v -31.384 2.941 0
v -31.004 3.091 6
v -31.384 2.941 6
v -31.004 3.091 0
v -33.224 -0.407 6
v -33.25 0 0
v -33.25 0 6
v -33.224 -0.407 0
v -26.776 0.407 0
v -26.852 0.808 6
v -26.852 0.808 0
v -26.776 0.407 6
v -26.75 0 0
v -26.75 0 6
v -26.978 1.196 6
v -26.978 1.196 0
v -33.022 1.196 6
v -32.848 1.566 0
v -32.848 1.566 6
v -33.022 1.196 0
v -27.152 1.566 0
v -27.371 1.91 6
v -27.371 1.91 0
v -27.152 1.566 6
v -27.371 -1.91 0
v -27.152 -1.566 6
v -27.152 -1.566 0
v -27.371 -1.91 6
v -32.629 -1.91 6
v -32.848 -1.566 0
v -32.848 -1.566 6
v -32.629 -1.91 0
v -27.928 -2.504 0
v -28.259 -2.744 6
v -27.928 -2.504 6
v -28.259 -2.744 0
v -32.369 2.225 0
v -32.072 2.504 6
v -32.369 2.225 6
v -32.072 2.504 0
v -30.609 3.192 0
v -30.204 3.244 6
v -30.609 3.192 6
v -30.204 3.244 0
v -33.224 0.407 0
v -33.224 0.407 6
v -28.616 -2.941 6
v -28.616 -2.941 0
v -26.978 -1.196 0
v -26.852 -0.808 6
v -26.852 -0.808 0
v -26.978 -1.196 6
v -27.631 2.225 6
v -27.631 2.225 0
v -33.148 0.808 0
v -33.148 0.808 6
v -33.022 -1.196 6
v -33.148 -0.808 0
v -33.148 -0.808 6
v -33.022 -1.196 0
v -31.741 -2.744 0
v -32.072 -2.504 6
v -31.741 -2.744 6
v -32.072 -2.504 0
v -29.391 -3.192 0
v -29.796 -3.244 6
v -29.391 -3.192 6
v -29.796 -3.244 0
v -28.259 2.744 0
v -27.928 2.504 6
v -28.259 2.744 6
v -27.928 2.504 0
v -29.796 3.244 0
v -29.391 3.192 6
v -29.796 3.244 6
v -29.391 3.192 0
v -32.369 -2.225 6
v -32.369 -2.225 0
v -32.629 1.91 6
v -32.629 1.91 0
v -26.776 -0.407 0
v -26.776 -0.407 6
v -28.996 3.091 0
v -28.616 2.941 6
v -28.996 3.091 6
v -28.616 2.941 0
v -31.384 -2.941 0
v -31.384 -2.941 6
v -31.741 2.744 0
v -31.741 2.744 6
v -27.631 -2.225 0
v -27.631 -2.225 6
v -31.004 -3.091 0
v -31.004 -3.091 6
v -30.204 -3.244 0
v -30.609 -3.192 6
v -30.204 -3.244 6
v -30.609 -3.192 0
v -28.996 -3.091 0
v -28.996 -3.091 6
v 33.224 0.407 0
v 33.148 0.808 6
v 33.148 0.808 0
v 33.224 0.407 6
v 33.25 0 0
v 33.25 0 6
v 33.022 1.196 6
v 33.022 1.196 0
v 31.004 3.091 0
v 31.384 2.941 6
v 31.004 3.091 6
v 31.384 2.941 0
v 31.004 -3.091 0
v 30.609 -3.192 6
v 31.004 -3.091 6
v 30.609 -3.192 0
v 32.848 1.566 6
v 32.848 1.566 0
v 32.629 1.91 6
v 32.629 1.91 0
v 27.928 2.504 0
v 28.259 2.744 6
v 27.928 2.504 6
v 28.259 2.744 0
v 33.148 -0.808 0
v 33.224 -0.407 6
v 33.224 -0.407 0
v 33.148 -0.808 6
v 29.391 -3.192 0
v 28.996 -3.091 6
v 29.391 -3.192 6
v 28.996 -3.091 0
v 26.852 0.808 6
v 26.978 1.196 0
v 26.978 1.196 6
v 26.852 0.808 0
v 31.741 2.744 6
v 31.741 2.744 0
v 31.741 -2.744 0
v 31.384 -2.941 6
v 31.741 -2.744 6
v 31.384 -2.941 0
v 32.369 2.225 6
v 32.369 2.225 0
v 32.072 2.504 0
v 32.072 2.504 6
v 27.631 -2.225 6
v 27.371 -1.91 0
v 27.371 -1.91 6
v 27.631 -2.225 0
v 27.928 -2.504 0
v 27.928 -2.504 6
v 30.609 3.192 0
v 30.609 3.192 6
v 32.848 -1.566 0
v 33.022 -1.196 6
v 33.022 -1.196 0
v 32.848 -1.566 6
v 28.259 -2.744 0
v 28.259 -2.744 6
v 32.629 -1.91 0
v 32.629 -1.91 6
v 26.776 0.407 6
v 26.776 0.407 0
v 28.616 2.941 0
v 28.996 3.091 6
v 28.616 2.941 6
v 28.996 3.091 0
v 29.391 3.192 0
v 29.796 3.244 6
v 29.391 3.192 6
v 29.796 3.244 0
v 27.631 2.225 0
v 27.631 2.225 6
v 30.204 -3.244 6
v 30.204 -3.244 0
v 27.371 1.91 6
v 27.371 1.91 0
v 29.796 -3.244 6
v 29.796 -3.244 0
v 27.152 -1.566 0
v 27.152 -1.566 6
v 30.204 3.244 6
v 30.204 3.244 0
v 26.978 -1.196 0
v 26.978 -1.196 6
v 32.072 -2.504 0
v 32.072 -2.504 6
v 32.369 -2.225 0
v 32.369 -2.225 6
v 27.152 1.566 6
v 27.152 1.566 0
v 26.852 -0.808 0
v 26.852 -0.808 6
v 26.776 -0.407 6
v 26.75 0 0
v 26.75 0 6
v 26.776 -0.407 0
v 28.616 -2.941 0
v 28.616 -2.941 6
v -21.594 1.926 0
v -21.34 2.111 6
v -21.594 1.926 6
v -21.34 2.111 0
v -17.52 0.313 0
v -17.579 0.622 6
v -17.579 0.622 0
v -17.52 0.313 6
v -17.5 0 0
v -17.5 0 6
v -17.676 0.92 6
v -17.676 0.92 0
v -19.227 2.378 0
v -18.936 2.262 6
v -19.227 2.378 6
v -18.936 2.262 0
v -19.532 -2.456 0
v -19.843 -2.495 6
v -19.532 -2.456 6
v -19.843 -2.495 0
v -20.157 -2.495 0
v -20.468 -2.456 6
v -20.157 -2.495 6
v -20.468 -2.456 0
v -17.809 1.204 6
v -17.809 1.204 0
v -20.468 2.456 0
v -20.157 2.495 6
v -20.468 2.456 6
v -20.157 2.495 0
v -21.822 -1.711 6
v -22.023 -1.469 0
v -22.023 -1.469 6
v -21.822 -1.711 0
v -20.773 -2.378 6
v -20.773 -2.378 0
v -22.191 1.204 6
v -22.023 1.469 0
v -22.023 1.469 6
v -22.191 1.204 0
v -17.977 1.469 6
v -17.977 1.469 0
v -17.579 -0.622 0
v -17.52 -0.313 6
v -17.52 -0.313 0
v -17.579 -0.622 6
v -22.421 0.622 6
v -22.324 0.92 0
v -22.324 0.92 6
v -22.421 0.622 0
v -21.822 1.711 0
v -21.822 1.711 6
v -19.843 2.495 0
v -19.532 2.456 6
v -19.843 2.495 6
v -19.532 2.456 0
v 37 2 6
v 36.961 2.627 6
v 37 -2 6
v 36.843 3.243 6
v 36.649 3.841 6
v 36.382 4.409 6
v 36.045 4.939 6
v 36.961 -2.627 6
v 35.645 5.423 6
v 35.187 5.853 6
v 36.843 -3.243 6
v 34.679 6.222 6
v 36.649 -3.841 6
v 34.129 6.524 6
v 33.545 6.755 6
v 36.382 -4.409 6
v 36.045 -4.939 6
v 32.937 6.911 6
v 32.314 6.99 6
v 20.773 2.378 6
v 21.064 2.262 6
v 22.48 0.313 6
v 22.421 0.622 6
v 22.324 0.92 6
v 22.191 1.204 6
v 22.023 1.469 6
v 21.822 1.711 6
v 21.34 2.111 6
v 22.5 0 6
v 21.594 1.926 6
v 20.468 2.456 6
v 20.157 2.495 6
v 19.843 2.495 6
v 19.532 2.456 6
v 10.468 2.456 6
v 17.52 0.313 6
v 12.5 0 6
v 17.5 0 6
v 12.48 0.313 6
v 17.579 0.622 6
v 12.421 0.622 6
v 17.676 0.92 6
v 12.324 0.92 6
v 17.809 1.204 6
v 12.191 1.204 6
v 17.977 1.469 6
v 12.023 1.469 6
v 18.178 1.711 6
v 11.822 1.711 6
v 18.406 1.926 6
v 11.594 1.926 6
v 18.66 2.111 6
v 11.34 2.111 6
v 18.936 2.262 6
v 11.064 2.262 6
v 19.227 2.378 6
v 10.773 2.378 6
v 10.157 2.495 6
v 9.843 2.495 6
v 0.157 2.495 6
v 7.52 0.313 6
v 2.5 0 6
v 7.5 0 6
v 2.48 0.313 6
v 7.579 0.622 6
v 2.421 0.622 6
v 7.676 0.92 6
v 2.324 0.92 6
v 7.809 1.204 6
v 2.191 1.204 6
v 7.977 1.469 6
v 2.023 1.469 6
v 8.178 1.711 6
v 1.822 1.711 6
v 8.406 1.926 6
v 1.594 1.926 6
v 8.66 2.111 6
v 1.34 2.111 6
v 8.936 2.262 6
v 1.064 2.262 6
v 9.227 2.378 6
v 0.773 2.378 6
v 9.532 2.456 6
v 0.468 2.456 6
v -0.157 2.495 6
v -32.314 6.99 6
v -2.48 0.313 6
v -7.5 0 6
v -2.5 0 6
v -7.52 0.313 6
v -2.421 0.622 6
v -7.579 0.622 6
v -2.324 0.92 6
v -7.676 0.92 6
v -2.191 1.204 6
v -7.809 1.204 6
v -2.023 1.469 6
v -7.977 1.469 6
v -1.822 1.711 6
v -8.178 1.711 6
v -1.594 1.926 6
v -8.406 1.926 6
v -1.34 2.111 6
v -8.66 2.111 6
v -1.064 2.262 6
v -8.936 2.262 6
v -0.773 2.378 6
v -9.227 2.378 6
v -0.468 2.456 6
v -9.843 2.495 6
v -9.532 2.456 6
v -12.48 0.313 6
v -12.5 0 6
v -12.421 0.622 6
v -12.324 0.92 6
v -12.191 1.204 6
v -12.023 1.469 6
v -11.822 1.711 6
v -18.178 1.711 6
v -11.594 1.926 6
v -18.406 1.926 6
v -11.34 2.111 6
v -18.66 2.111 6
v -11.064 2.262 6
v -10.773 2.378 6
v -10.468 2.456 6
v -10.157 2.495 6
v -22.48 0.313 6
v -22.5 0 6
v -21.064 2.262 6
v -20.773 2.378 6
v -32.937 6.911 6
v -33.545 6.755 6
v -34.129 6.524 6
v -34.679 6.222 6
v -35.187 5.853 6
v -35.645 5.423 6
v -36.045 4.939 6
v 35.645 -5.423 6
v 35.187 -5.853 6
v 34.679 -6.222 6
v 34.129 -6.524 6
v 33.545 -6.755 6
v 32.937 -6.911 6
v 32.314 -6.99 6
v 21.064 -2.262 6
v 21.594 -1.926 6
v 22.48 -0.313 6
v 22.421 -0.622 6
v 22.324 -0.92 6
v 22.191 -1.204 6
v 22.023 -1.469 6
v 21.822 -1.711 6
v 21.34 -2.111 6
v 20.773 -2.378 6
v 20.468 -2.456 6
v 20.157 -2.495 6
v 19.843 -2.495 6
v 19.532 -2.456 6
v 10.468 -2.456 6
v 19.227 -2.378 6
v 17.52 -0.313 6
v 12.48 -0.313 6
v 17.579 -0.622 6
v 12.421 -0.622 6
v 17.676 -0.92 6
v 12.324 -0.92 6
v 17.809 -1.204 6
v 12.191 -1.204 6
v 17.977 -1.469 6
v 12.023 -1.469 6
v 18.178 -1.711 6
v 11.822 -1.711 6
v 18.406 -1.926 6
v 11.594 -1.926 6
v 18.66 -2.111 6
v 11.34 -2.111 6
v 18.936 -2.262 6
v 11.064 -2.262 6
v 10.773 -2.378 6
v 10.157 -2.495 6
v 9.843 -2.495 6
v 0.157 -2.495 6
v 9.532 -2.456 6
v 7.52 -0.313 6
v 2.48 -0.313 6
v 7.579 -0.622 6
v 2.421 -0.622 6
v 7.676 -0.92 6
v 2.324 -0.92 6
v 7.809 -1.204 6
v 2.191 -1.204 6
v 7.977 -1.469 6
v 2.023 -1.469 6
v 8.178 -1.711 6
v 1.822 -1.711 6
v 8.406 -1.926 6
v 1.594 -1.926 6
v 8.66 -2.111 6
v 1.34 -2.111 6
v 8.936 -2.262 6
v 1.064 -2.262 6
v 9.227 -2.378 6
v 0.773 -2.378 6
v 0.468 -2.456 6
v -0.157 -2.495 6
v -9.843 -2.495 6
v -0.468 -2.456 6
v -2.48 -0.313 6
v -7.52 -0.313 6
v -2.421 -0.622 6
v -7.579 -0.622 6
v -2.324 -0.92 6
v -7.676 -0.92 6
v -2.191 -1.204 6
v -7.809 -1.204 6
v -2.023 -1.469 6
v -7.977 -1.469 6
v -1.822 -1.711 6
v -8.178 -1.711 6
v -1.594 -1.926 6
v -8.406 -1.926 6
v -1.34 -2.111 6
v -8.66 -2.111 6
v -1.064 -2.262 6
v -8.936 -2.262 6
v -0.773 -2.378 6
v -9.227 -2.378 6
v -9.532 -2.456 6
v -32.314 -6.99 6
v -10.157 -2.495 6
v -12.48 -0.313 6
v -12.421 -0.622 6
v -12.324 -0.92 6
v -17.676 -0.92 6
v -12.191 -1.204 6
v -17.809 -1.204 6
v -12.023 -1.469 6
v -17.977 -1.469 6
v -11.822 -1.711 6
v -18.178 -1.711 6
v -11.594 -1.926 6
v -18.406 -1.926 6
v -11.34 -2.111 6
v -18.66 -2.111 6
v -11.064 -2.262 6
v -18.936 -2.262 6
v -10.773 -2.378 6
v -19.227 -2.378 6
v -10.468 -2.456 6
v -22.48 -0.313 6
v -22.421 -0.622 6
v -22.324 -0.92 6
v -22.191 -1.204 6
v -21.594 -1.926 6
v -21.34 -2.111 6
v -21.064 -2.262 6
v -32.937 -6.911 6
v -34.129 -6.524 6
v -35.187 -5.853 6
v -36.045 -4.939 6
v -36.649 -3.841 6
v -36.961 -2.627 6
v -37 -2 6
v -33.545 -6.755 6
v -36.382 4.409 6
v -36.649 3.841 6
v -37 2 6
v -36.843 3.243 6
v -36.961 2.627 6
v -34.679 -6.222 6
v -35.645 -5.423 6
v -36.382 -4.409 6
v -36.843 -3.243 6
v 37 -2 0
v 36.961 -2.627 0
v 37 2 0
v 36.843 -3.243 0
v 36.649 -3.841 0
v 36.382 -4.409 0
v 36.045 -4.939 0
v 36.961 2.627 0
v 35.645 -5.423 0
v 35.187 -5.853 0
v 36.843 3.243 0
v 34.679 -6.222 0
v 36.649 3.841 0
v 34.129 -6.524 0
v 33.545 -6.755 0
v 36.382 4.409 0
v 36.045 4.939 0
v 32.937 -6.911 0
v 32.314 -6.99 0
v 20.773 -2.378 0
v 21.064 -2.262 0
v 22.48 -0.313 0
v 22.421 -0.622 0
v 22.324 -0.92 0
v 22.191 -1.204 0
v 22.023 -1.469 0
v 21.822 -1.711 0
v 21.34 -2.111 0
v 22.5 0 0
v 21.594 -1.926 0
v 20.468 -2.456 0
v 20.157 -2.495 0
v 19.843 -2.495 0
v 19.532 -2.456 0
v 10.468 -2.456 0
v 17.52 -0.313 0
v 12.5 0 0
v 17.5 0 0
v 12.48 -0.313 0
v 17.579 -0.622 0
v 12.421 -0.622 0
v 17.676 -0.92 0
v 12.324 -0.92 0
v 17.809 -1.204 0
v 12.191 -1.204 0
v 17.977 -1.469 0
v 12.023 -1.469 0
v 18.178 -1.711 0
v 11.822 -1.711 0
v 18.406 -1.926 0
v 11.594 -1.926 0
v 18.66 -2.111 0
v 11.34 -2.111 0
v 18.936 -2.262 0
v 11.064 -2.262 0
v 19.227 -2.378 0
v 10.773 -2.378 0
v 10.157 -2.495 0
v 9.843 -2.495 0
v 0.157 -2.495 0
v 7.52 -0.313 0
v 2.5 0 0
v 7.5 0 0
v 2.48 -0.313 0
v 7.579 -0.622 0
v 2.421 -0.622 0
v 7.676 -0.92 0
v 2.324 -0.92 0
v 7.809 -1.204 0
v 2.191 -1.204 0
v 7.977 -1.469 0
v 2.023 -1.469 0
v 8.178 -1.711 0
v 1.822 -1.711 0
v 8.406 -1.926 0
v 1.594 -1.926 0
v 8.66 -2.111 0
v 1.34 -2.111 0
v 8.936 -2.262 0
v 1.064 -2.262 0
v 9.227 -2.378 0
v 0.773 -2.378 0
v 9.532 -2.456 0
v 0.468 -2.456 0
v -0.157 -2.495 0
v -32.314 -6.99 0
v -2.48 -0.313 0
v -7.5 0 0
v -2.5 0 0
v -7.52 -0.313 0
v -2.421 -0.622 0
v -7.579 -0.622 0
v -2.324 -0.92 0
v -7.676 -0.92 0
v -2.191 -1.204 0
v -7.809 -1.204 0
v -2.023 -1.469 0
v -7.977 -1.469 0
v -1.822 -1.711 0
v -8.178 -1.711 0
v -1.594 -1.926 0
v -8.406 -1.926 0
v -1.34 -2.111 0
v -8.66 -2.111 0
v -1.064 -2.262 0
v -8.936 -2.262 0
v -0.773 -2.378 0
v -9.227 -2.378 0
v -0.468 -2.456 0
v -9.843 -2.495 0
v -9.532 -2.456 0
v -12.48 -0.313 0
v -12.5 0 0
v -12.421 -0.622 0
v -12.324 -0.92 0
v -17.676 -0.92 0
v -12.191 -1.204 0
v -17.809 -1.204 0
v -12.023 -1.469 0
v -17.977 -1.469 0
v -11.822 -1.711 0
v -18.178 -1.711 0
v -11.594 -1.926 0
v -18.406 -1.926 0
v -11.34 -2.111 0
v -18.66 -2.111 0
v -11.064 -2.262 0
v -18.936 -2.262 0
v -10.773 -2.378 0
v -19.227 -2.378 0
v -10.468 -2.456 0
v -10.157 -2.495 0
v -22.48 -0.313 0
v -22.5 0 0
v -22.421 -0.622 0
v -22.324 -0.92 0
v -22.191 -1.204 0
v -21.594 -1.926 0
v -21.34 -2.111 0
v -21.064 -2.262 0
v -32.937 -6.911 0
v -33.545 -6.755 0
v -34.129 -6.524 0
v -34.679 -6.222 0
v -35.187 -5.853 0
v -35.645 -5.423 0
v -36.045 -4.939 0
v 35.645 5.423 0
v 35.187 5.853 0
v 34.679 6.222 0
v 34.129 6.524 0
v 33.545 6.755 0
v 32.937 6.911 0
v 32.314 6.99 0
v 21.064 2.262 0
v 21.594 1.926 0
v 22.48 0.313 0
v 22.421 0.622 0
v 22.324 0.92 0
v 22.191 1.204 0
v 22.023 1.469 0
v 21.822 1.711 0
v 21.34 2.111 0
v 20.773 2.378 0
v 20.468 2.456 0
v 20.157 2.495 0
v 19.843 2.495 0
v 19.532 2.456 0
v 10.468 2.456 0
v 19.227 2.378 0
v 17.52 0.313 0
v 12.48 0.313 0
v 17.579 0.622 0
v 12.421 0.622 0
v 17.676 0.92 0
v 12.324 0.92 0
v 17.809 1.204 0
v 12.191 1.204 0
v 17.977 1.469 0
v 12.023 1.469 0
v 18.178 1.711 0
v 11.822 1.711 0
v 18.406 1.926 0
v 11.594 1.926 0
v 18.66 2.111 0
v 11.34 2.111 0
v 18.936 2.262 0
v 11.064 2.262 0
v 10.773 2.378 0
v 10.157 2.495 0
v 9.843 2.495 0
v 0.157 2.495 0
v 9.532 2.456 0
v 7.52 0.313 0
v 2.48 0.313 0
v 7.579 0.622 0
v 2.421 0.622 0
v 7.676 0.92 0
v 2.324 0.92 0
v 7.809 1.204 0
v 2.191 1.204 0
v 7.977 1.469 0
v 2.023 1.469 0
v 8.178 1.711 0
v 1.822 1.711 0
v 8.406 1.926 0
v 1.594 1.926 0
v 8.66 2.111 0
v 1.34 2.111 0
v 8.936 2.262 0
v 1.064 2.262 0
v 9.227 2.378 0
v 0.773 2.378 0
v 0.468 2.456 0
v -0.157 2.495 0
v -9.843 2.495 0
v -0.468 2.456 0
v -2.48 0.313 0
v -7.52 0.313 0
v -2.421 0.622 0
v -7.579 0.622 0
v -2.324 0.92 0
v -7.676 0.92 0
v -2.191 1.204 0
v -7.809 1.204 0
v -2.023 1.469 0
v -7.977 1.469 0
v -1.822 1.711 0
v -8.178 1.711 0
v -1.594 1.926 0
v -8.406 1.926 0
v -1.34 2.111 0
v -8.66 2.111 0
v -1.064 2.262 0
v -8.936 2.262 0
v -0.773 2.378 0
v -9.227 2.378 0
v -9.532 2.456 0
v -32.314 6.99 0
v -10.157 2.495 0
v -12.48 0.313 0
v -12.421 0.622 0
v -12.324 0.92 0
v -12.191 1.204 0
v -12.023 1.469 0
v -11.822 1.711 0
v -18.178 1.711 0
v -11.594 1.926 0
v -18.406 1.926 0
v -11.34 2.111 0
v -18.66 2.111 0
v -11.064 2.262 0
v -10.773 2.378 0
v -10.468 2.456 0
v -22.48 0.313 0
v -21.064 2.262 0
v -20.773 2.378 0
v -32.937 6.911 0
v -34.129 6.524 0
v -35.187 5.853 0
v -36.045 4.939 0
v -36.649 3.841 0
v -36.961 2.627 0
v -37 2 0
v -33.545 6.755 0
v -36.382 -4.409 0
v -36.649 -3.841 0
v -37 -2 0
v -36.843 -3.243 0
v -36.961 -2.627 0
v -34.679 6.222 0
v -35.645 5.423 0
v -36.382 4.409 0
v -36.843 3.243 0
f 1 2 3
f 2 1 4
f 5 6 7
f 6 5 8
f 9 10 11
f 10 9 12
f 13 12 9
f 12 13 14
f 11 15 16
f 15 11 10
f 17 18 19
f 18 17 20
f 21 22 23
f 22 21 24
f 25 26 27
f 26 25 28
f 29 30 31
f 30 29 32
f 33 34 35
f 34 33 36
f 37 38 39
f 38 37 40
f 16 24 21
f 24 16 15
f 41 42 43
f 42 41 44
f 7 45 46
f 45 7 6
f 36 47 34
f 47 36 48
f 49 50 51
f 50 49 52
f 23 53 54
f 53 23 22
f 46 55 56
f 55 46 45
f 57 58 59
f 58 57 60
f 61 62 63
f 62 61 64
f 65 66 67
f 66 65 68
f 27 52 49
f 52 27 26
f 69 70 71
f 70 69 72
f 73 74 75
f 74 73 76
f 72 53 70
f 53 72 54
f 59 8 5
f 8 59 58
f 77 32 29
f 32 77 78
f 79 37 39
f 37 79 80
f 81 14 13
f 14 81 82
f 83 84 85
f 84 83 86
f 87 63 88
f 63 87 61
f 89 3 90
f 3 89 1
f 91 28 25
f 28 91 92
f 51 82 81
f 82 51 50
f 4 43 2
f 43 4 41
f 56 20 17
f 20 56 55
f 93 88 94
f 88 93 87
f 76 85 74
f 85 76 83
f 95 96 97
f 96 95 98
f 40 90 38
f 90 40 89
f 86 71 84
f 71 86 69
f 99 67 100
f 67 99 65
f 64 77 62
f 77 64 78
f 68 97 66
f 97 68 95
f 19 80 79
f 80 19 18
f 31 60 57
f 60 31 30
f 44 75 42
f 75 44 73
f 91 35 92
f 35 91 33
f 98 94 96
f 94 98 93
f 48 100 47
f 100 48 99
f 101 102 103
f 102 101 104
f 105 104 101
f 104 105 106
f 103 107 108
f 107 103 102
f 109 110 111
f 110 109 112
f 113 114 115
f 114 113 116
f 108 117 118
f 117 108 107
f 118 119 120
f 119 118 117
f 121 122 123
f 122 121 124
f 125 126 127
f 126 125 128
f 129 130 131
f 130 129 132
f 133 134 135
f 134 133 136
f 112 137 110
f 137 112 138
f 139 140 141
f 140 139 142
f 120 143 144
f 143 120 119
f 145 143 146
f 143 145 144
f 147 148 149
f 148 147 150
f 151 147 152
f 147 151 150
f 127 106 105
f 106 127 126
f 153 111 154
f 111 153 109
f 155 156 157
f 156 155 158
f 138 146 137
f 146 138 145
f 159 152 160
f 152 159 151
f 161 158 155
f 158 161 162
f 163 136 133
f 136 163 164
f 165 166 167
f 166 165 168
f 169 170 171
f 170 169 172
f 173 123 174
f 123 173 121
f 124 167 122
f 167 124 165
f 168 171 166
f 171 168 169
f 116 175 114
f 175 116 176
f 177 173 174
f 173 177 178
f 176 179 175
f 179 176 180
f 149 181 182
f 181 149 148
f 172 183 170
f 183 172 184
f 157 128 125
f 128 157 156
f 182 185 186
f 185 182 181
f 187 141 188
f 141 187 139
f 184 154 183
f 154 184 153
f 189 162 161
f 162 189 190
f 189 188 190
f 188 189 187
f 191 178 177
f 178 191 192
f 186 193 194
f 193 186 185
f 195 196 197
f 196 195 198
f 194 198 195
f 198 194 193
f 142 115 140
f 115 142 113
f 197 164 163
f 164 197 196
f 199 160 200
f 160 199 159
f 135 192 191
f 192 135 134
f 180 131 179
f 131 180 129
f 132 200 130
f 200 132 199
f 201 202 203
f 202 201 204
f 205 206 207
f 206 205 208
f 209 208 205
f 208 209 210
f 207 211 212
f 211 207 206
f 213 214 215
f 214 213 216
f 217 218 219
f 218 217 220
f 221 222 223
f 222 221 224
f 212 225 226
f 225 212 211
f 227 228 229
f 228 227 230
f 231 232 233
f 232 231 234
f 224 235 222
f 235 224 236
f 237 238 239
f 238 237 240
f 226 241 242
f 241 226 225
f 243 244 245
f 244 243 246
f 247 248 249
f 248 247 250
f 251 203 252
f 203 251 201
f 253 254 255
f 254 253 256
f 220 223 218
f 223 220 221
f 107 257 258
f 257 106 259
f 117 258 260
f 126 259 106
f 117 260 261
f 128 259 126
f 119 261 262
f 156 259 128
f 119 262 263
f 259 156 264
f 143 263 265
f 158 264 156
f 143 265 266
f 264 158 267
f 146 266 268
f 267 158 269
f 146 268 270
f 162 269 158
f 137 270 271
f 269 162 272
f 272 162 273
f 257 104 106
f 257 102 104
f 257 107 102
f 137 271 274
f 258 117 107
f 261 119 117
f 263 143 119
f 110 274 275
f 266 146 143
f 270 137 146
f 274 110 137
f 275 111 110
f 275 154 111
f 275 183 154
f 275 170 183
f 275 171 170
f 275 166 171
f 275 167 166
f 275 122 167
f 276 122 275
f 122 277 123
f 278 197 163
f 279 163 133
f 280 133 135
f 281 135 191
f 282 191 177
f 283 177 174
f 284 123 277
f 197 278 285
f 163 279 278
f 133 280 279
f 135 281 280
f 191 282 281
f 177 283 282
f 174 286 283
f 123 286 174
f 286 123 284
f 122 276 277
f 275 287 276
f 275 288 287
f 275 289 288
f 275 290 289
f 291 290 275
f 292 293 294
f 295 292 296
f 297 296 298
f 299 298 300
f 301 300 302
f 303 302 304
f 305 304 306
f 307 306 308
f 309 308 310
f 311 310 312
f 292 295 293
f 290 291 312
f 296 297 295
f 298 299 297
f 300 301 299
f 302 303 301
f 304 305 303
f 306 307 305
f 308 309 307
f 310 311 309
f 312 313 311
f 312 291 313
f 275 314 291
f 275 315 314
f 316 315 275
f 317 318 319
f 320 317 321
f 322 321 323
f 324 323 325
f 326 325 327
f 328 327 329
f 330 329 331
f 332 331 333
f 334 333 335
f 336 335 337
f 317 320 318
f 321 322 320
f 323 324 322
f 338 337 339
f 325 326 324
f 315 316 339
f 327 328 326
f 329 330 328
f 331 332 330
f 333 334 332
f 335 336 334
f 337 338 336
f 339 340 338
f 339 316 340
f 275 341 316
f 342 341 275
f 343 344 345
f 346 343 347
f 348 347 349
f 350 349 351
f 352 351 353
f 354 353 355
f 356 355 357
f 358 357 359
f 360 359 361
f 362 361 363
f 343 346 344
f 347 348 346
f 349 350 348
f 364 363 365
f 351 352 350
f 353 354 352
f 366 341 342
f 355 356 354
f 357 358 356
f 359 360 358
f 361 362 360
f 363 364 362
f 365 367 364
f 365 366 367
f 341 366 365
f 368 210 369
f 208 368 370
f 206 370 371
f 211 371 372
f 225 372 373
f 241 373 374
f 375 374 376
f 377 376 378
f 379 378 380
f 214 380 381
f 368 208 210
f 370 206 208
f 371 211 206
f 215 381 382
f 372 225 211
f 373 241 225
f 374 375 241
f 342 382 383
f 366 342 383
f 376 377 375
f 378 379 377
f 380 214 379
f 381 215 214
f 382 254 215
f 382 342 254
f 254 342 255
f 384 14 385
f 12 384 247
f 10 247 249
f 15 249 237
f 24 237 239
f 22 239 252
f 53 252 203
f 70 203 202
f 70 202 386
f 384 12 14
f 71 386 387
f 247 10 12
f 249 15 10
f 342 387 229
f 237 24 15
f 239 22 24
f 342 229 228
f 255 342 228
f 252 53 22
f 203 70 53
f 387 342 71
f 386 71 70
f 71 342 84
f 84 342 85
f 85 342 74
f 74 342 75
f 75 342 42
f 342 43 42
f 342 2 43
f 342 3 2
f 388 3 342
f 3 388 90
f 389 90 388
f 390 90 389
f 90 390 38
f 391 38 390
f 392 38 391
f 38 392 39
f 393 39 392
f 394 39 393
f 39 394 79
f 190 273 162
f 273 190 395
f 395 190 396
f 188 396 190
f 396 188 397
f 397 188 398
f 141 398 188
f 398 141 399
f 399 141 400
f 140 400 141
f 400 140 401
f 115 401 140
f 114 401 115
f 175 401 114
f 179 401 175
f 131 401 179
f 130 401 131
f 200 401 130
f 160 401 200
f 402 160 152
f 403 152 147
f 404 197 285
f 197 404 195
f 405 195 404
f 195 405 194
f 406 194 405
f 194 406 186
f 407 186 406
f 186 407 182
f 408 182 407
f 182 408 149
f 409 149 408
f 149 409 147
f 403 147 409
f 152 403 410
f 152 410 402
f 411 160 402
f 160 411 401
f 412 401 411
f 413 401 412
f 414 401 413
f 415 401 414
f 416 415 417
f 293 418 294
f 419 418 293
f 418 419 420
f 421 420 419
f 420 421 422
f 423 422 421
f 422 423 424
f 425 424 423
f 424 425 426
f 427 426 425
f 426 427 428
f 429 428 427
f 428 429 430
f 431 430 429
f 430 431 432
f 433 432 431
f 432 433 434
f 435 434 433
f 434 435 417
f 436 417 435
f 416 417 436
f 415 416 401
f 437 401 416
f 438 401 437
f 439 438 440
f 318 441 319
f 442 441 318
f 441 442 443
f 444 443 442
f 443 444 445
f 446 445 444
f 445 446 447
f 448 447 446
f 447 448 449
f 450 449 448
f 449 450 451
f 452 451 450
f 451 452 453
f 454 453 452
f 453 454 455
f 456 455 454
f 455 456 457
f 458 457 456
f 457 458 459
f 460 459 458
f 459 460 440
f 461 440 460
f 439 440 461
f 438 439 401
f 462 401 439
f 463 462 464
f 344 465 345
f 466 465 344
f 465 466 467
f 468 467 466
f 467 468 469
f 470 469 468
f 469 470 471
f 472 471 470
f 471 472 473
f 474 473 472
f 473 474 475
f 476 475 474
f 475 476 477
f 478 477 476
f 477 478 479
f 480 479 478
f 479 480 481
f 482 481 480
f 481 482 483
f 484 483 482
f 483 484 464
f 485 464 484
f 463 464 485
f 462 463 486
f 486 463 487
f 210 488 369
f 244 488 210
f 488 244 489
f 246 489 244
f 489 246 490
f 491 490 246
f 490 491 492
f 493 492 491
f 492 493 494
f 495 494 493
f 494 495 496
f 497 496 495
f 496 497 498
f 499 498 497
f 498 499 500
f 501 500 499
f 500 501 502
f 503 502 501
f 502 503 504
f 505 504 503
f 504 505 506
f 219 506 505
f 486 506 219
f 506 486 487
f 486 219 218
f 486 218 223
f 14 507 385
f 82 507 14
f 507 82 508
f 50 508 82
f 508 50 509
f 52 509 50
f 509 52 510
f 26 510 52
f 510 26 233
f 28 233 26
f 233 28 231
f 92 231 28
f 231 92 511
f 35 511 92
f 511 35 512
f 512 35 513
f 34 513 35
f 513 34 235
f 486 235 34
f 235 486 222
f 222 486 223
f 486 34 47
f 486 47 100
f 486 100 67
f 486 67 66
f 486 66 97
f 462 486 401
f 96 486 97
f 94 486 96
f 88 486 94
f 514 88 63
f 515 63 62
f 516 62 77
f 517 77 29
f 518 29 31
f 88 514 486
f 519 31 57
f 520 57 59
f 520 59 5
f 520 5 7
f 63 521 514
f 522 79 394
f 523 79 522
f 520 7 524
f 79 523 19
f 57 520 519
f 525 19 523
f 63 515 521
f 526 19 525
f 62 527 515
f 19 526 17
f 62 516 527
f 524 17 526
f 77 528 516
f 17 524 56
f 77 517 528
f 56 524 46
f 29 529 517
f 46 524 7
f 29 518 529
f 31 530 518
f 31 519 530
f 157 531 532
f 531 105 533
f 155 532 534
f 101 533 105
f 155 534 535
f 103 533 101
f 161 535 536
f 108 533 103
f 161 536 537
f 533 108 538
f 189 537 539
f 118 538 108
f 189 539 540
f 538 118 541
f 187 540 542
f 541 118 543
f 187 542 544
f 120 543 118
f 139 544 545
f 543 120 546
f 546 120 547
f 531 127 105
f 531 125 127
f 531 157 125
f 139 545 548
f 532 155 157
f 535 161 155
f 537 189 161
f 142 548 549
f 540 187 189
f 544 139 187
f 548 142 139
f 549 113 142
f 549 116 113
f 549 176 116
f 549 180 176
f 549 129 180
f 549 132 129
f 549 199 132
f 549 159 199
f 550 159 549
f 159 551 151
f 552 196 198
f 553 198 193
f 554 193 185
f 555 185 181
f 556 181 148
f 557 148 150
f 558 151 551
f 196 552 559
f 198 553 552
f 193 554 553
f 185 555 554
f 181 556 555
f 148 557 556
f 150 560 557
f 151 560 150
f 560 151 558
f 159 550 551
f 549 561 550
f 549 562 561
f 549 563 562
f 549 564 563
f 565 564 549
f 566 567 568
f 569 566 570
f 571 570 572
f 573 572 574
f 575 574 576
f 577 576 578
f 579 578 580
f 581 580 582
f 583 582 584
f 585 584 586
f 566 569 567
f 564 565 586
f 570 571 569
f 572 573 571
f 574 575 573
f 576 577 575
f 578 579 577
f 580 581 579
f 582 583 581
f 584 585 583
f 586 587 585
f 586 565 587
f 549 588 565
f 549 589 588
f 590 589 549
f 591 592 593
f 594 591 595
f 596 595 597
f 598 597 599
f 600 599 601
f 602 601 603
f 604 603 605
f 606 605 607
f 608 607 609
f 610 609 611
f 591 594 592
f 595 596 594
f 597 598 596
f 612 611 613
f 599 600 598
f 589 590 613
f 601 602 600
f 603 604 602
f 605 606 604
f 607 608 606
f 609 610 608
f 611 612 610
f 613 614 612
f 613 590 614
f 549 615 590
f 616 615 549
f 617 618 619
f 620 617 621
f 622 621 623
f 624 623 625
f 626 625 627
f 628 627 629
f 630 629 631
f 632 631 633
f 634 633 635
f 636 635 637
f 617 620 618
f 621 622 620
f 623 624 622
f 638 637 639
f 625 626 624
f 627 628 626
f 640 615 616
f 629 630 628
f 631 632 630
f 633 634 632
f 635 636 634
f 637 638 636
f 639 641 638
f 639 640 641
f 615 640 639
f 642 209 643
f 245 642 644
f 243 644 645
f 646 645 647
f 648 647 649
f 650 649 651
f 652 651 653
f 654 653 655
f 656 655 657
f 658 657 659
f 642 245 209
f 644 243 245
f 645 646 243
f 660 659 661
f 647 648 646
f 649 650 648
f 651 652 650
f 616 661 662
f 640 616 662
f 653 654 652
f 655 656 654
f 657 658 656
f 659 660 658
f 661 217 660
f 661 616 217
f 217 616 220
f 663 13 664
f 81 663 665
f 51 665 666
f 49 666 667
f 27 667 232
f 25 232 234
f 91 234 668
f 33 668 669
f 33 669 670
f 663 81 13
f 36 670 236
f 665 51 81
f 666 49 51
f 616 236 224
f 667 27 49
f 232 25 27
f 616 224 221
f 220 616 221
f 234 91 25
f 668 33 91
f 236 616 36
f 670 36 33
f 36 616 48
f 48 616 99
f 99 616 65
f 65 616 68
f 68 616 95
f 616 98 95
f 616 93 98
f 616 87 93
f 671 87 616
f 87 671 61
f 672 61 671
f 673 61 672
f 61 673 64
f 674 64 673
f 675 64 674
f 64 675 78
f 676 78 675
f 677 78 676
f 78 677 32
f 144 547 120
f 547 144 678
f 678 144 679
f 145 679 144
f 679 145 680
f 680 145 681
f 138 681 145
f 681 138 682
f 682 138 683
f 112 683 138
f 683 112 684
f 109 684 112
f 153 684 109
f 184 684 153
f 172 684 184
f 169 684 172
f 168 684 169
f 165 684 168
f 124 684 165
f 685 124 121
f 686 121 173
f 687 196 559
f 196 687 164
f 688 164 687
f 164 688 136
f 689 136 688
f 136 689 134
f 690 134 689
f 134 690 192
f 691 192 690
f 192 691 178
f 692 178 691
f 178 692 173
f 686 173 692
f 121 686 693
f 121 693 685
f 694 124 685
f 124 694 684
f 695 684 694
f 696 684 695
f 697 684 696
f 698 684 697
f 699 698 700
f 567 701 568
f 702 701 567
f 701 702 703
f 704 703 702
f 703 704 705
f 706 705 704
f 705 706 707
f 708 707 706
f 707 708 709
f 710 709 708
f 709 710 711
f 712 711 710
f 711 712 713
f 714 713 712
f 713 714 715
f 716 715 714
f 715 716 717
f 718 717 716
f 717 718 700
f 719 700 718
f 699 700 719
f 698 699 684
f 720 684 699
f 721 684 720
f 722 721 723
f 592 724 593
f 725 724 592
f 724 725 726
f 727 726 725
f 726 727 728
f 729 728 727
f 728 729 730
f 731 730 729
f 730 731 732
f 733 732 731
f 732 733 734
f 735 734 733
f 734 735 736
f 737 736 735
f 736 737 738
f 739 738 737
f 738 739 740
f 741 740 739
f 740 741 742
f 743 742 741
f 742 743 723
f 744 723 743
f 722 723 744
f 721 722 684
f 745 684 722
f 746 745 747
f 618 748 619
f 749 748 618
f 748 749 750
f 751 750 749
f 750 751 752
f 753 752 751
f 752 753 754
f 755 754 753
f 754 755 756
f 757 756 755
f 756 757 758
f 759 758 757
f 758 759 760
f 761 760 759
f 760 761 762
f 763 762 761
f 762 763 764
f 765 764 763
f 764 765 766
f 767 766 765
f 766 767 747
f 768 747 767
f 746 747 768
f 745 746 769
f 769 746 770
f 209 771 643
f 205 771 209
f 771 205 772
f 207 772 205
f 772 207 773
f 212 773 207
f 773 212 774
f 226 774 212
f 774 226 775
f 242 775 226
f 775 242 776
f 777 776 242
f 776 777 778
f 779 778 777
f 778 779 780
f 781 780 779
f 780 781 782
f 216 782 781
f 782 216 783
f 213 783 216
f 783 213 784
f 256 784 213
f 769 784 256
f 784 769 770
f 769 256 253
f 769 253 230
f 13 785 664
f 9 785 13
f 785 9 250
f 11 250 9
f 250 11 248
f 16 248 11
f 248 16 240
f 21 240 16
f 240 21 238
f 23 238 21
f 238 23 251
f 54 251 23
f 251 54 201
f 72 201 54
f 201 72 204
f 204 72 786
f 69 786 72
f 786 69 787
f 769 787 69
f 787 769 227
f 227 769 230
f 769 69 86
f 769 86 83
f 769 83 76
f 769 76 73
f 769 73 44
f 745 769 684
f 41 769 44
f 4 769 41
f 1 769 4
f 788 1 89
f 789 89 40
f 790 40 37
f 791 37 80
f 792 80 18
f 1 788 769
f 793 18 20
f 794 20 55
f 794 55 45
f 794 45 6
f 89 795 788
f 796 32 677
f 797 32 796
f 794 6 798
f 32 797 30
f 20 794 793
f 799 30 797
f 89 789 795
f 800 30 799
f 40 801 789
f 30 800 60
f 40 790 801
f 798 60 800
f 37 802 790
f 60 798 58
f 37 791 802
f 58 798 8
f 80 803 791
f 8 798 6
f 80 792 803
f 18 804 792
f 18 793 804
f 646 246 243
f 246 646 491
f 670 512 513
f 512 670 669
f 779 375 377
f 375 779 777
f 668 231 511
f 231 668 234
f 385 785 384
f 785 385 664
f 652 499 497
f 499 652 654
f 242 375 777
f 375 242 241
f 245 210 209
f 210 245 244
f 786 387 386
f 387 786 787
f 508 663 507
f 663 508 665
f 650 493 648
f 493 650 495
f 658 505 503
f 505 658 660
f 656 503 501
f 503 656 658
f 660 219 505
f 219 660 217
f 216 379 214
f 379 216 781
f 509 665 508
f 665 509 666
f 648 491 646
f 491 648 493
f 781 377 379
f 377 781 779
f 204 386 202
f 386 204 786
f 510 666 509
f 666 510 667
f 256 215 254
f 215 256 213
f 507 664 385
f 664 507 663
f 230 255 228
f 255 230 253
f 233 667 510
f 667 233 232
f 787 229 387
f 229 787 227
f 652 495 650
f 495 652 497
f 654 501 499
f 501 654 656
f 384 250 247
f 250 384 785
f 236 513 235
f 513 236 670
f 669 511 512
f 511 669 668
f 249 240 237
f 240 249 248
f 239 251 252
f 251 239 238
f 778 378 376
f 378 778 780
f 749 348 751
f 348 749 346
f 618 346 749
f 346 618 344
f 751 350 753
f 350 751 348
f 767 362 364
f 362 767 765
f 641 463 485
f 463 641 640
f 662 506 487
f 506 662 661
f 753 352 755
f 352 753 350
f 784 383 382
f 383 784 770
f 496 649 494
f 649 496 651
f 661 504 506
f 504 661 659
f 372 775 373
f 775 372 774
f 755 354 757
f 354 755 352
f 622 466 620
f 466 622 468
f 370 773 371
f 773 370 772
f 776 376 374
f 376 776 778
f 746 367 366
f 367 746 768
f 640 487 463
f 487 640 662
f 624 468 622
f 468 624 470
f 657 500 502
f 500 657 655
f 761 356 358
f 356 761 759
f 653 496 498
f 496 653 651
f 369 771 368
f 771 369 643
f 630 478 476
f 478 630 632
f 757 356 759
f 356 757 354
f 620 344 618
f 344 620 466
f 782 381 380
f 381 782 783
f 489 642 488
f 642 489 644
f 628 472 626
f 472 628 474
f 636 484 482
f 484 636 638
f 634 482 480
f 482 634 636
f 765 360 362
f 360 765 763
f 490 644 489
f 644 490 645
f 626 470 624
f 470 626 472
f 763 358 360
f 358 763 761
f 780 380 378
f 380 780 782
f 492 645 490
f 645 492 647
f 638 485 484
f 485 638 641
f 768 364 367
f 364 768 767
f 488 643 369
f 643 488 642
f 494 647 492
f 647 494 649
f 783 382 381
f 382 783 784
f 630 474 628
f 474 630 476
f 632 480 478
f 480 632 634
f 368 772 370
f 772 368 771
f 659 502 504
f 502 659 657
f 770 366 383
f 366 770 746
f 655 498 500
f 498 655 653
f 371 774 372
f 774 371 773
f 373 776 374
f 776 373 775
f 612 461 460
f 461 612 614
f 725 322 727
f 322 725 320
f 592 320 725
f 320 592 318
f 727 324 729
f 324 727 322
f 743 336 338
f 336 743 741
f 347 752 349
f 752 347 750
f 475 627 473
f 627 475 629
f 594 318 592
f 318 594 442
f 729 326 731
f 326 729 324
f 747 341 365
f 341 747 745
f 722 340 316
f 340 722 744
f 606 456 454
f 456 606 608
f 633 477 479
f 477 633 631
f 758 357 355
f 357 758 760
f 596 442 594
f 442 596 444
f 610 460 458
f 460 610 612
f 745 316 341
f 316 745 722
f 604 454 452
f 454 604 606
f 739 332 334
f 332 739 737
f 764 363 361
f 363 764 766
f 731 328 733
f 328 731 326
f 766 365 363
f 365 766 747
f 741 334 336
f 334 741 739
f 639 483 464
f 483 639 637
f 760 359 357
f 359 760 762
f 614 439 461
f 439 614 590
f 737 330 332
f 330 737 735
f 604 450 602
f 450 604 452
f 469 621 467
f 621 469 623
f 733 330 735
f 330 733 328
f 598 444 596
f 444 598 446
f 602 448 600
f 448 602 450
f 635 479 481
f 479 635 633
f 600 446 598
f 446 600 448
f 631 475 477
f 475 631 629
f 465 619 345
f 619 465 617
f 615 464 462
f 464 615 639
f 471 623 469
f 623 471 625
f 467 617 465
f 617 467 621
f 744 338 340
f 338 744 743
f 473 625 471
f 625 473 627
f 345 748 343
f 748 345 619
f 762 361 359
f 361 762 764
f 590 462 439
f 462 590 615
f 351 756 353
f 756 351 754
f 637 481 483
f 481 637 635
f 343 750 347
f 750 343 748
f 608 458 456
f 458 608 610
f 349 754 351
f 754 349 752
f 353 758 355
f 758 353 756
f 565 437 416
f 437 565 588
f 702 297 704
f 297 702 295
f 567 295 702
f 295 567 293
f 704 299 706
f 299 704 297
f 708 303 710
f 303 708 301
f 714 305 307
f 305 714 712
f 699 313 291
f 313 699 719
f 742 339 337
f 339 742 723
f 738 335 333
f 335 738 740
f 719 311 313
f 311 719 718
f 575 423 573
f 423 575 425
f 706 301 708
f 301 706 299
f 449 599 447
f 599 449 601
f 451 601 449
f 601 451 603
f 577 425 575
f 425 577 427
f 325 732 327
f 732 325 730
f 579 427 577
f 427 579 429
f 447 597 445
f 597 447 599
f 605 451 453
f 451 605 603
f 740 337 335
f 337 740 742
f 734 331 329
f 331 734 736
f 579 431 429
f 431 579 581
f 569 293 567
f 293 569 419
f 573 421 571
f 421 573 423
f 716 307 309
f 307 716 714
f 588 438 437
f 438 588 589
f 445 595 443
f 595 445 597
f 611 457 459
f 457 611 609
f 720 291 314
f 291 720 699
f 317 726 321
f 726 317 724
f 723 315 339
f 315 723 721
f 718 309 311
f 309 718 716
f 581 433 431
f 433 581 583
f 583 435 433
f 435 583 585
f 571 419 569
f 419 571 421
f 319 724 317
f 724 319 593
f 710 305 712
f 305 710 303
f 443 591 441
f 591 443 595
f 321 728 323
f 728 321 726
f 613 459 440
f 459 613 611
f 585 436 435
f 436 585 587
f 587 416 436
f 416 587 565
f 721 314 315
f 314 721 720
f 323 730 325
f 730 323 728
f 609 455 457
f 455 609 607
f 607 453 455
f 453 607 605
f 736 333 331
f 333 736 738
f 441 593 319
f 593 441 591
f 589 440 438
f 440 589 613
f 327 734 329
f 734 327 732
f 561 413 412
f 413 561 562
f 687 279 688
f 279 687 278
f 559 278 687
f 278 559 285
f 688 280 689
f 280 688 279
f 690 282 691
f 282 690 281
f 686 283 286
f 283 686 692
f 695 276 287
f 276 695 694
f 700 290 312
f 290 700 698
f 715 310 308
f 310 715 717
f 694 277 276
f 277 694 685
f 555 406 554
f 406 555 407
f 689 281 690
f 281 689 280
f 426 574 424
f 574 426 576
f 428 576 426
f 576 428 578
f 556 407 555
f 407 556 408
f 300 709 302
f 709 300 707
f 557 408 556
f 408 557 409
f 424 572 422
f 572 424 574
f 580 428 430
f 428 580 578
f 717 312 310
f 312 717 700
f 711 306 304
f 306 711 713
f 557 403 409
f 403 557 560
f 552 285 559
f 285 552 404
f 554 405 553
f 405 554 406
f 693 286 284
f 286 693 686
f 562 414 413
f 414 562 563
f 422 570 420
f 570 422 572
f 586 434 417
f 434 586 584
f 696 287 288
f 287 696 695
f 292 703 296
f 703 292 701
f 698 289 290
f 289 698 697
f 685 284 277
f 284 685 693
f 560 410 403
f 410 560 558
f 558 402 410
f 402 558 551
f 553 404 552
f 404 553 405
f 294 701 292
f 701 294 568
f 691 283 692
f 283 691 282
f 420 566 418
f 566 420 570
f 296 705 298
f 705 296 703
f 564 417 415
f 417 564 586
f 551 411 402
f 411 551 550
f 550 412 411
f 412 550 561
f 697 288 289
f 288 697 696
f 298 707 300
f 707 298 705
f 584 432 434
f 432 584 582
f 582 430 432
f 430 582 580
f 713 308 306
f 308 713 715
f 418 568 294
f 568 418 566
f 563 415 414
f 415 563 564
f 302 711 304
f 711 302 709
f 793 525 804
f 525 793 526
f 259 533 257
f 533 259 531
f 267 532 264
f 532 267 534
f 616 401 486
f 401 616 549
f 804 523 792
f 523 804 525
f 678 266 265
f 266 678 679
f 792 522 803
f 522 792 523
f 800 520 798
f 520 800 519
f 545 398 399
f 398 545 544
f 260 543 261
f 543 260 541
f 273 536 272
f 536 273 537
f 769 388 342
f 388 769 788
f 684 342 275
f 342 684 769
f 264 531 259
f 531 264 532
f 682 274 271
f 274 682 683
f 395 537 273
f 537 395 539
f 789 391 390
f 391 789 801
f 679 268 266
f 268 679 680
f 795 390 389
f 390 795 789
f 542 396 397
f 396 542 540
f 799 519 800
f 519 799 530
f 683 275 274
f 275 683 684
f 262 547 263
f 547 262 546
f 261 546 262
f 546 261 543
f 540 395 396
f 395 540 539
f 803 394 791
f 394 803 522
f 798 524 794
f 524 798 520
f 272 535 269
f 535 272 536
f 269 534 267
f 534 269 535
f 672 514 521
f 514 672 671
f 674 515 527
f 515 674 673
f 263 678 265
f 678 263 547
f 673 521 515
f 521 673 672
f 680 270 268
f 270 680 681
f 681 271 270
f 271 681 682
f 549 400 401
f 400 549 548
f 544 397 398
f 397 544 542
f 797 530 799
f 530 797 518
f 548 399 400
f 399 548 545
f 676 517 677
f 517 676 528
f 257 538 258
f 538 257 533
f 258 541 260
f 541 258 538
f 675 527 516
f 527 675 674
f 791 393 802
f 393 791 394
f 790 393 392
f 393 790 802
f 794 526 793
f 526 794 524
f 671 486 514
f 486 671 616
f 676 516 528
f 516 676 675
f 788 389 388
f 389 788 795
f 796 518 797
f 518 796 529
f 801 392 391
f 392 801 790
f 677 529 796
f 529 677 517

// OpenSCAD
$fn = 50;


difference() {
	union() {
		hull() {
			translate(v = [-32.0000000000, 2.0000000000, 0]) {
				cylinder(h = 6, r = 5);
			}
			translate(v = [32.0000000000, 2.0000000000, 0]) {
				cylinder(h = 6, r = 5);
			}
			translate(v = [-32.0000000000, -2.0000000000, 0]) {
				cylinder(h = 6, r = 5);
			}
			translate(v = [32.0000000000, -2.0000000000, 0]) {
				cylinder(h = 6, r = 5);
			}
		}
	}
	union() {
		#translate(v = [-30.0000000000, 0.0000000000, 0]) {
			cylinder(h = 6, r = 3.2500000000);
		}
		#translate(v = [30.0000000000, 0.0000000000, 0]) {
			cylinder(h = 6, r = 3.2500000000);
		}
		#translate(v = [-30.0000000000, 0.0000000000, -100.0000000000]) {
			cylinder(h = 200, r = 3.2500000000);
		}
		#translate(v = [-30.0000000000, 0.0000000000, -100.0000000000]) {
			cylinder(h = 200, r = 3.2500000000);
		}
		#translate(v = [30.0000000000, 0.0000000000, -100.0000000000]) {
			cylinder(h = 200, r = 3.2500000000);
		}
		#translate(v = [30.0000000000, 0.0000000000, -100.0000000000]) {
			cylinder(h = 200, r = 3.2500000000);
		}
		#translate(v = [-30.0000000000, 0.0000000000, 0]) {
			cylinder(h = 6, r = 1.8000000000);
		}
		#translate(v = [30.0000000000, 0.0000000000, 0]) {
			cylinder(h = 6, r = 1.8000000000);
		}
		#translate(v = [-30.0000000000, 0.0000000000, 0]) {
			cylinder(h = 6, r = 1.8000000000);
		}
		#translate(v = [30.0000000000, 0.0000000000, 0]) {
			cylinder(h = 6, r = 1.8000000000);
		}
		#translate(v = [-30.0000000000, 0.0000000000, 0]) {
			cylinder(h = 6, r = 1.8000000000);
		}
		#translate(v = [30.0000000000, 0.0000000000, 0]) {
			cylinder(h = 6, r = 1.8000000000);
		}
		#translate(v = [-20.0000000000, 0, 0]) {
			cylinder(h = 6, r = 2.5000000000);
		}
		#translate(v = [-10.0000000000, 0, 0]) {
			cylinder(h = 6, r = 2.5000000000);
		}
		#cylinder(h = 6, r = 2.5000000000);
		#translate(v = [10.0000000000, 0, 0]) {
			cylinder(h = 6, r = 2.5000000000);
		}
		#translate(v = [20.0000000000, 0, 0]) {
			cylinder(h = 6, r = 2.5000000000);
		}
	}
}
